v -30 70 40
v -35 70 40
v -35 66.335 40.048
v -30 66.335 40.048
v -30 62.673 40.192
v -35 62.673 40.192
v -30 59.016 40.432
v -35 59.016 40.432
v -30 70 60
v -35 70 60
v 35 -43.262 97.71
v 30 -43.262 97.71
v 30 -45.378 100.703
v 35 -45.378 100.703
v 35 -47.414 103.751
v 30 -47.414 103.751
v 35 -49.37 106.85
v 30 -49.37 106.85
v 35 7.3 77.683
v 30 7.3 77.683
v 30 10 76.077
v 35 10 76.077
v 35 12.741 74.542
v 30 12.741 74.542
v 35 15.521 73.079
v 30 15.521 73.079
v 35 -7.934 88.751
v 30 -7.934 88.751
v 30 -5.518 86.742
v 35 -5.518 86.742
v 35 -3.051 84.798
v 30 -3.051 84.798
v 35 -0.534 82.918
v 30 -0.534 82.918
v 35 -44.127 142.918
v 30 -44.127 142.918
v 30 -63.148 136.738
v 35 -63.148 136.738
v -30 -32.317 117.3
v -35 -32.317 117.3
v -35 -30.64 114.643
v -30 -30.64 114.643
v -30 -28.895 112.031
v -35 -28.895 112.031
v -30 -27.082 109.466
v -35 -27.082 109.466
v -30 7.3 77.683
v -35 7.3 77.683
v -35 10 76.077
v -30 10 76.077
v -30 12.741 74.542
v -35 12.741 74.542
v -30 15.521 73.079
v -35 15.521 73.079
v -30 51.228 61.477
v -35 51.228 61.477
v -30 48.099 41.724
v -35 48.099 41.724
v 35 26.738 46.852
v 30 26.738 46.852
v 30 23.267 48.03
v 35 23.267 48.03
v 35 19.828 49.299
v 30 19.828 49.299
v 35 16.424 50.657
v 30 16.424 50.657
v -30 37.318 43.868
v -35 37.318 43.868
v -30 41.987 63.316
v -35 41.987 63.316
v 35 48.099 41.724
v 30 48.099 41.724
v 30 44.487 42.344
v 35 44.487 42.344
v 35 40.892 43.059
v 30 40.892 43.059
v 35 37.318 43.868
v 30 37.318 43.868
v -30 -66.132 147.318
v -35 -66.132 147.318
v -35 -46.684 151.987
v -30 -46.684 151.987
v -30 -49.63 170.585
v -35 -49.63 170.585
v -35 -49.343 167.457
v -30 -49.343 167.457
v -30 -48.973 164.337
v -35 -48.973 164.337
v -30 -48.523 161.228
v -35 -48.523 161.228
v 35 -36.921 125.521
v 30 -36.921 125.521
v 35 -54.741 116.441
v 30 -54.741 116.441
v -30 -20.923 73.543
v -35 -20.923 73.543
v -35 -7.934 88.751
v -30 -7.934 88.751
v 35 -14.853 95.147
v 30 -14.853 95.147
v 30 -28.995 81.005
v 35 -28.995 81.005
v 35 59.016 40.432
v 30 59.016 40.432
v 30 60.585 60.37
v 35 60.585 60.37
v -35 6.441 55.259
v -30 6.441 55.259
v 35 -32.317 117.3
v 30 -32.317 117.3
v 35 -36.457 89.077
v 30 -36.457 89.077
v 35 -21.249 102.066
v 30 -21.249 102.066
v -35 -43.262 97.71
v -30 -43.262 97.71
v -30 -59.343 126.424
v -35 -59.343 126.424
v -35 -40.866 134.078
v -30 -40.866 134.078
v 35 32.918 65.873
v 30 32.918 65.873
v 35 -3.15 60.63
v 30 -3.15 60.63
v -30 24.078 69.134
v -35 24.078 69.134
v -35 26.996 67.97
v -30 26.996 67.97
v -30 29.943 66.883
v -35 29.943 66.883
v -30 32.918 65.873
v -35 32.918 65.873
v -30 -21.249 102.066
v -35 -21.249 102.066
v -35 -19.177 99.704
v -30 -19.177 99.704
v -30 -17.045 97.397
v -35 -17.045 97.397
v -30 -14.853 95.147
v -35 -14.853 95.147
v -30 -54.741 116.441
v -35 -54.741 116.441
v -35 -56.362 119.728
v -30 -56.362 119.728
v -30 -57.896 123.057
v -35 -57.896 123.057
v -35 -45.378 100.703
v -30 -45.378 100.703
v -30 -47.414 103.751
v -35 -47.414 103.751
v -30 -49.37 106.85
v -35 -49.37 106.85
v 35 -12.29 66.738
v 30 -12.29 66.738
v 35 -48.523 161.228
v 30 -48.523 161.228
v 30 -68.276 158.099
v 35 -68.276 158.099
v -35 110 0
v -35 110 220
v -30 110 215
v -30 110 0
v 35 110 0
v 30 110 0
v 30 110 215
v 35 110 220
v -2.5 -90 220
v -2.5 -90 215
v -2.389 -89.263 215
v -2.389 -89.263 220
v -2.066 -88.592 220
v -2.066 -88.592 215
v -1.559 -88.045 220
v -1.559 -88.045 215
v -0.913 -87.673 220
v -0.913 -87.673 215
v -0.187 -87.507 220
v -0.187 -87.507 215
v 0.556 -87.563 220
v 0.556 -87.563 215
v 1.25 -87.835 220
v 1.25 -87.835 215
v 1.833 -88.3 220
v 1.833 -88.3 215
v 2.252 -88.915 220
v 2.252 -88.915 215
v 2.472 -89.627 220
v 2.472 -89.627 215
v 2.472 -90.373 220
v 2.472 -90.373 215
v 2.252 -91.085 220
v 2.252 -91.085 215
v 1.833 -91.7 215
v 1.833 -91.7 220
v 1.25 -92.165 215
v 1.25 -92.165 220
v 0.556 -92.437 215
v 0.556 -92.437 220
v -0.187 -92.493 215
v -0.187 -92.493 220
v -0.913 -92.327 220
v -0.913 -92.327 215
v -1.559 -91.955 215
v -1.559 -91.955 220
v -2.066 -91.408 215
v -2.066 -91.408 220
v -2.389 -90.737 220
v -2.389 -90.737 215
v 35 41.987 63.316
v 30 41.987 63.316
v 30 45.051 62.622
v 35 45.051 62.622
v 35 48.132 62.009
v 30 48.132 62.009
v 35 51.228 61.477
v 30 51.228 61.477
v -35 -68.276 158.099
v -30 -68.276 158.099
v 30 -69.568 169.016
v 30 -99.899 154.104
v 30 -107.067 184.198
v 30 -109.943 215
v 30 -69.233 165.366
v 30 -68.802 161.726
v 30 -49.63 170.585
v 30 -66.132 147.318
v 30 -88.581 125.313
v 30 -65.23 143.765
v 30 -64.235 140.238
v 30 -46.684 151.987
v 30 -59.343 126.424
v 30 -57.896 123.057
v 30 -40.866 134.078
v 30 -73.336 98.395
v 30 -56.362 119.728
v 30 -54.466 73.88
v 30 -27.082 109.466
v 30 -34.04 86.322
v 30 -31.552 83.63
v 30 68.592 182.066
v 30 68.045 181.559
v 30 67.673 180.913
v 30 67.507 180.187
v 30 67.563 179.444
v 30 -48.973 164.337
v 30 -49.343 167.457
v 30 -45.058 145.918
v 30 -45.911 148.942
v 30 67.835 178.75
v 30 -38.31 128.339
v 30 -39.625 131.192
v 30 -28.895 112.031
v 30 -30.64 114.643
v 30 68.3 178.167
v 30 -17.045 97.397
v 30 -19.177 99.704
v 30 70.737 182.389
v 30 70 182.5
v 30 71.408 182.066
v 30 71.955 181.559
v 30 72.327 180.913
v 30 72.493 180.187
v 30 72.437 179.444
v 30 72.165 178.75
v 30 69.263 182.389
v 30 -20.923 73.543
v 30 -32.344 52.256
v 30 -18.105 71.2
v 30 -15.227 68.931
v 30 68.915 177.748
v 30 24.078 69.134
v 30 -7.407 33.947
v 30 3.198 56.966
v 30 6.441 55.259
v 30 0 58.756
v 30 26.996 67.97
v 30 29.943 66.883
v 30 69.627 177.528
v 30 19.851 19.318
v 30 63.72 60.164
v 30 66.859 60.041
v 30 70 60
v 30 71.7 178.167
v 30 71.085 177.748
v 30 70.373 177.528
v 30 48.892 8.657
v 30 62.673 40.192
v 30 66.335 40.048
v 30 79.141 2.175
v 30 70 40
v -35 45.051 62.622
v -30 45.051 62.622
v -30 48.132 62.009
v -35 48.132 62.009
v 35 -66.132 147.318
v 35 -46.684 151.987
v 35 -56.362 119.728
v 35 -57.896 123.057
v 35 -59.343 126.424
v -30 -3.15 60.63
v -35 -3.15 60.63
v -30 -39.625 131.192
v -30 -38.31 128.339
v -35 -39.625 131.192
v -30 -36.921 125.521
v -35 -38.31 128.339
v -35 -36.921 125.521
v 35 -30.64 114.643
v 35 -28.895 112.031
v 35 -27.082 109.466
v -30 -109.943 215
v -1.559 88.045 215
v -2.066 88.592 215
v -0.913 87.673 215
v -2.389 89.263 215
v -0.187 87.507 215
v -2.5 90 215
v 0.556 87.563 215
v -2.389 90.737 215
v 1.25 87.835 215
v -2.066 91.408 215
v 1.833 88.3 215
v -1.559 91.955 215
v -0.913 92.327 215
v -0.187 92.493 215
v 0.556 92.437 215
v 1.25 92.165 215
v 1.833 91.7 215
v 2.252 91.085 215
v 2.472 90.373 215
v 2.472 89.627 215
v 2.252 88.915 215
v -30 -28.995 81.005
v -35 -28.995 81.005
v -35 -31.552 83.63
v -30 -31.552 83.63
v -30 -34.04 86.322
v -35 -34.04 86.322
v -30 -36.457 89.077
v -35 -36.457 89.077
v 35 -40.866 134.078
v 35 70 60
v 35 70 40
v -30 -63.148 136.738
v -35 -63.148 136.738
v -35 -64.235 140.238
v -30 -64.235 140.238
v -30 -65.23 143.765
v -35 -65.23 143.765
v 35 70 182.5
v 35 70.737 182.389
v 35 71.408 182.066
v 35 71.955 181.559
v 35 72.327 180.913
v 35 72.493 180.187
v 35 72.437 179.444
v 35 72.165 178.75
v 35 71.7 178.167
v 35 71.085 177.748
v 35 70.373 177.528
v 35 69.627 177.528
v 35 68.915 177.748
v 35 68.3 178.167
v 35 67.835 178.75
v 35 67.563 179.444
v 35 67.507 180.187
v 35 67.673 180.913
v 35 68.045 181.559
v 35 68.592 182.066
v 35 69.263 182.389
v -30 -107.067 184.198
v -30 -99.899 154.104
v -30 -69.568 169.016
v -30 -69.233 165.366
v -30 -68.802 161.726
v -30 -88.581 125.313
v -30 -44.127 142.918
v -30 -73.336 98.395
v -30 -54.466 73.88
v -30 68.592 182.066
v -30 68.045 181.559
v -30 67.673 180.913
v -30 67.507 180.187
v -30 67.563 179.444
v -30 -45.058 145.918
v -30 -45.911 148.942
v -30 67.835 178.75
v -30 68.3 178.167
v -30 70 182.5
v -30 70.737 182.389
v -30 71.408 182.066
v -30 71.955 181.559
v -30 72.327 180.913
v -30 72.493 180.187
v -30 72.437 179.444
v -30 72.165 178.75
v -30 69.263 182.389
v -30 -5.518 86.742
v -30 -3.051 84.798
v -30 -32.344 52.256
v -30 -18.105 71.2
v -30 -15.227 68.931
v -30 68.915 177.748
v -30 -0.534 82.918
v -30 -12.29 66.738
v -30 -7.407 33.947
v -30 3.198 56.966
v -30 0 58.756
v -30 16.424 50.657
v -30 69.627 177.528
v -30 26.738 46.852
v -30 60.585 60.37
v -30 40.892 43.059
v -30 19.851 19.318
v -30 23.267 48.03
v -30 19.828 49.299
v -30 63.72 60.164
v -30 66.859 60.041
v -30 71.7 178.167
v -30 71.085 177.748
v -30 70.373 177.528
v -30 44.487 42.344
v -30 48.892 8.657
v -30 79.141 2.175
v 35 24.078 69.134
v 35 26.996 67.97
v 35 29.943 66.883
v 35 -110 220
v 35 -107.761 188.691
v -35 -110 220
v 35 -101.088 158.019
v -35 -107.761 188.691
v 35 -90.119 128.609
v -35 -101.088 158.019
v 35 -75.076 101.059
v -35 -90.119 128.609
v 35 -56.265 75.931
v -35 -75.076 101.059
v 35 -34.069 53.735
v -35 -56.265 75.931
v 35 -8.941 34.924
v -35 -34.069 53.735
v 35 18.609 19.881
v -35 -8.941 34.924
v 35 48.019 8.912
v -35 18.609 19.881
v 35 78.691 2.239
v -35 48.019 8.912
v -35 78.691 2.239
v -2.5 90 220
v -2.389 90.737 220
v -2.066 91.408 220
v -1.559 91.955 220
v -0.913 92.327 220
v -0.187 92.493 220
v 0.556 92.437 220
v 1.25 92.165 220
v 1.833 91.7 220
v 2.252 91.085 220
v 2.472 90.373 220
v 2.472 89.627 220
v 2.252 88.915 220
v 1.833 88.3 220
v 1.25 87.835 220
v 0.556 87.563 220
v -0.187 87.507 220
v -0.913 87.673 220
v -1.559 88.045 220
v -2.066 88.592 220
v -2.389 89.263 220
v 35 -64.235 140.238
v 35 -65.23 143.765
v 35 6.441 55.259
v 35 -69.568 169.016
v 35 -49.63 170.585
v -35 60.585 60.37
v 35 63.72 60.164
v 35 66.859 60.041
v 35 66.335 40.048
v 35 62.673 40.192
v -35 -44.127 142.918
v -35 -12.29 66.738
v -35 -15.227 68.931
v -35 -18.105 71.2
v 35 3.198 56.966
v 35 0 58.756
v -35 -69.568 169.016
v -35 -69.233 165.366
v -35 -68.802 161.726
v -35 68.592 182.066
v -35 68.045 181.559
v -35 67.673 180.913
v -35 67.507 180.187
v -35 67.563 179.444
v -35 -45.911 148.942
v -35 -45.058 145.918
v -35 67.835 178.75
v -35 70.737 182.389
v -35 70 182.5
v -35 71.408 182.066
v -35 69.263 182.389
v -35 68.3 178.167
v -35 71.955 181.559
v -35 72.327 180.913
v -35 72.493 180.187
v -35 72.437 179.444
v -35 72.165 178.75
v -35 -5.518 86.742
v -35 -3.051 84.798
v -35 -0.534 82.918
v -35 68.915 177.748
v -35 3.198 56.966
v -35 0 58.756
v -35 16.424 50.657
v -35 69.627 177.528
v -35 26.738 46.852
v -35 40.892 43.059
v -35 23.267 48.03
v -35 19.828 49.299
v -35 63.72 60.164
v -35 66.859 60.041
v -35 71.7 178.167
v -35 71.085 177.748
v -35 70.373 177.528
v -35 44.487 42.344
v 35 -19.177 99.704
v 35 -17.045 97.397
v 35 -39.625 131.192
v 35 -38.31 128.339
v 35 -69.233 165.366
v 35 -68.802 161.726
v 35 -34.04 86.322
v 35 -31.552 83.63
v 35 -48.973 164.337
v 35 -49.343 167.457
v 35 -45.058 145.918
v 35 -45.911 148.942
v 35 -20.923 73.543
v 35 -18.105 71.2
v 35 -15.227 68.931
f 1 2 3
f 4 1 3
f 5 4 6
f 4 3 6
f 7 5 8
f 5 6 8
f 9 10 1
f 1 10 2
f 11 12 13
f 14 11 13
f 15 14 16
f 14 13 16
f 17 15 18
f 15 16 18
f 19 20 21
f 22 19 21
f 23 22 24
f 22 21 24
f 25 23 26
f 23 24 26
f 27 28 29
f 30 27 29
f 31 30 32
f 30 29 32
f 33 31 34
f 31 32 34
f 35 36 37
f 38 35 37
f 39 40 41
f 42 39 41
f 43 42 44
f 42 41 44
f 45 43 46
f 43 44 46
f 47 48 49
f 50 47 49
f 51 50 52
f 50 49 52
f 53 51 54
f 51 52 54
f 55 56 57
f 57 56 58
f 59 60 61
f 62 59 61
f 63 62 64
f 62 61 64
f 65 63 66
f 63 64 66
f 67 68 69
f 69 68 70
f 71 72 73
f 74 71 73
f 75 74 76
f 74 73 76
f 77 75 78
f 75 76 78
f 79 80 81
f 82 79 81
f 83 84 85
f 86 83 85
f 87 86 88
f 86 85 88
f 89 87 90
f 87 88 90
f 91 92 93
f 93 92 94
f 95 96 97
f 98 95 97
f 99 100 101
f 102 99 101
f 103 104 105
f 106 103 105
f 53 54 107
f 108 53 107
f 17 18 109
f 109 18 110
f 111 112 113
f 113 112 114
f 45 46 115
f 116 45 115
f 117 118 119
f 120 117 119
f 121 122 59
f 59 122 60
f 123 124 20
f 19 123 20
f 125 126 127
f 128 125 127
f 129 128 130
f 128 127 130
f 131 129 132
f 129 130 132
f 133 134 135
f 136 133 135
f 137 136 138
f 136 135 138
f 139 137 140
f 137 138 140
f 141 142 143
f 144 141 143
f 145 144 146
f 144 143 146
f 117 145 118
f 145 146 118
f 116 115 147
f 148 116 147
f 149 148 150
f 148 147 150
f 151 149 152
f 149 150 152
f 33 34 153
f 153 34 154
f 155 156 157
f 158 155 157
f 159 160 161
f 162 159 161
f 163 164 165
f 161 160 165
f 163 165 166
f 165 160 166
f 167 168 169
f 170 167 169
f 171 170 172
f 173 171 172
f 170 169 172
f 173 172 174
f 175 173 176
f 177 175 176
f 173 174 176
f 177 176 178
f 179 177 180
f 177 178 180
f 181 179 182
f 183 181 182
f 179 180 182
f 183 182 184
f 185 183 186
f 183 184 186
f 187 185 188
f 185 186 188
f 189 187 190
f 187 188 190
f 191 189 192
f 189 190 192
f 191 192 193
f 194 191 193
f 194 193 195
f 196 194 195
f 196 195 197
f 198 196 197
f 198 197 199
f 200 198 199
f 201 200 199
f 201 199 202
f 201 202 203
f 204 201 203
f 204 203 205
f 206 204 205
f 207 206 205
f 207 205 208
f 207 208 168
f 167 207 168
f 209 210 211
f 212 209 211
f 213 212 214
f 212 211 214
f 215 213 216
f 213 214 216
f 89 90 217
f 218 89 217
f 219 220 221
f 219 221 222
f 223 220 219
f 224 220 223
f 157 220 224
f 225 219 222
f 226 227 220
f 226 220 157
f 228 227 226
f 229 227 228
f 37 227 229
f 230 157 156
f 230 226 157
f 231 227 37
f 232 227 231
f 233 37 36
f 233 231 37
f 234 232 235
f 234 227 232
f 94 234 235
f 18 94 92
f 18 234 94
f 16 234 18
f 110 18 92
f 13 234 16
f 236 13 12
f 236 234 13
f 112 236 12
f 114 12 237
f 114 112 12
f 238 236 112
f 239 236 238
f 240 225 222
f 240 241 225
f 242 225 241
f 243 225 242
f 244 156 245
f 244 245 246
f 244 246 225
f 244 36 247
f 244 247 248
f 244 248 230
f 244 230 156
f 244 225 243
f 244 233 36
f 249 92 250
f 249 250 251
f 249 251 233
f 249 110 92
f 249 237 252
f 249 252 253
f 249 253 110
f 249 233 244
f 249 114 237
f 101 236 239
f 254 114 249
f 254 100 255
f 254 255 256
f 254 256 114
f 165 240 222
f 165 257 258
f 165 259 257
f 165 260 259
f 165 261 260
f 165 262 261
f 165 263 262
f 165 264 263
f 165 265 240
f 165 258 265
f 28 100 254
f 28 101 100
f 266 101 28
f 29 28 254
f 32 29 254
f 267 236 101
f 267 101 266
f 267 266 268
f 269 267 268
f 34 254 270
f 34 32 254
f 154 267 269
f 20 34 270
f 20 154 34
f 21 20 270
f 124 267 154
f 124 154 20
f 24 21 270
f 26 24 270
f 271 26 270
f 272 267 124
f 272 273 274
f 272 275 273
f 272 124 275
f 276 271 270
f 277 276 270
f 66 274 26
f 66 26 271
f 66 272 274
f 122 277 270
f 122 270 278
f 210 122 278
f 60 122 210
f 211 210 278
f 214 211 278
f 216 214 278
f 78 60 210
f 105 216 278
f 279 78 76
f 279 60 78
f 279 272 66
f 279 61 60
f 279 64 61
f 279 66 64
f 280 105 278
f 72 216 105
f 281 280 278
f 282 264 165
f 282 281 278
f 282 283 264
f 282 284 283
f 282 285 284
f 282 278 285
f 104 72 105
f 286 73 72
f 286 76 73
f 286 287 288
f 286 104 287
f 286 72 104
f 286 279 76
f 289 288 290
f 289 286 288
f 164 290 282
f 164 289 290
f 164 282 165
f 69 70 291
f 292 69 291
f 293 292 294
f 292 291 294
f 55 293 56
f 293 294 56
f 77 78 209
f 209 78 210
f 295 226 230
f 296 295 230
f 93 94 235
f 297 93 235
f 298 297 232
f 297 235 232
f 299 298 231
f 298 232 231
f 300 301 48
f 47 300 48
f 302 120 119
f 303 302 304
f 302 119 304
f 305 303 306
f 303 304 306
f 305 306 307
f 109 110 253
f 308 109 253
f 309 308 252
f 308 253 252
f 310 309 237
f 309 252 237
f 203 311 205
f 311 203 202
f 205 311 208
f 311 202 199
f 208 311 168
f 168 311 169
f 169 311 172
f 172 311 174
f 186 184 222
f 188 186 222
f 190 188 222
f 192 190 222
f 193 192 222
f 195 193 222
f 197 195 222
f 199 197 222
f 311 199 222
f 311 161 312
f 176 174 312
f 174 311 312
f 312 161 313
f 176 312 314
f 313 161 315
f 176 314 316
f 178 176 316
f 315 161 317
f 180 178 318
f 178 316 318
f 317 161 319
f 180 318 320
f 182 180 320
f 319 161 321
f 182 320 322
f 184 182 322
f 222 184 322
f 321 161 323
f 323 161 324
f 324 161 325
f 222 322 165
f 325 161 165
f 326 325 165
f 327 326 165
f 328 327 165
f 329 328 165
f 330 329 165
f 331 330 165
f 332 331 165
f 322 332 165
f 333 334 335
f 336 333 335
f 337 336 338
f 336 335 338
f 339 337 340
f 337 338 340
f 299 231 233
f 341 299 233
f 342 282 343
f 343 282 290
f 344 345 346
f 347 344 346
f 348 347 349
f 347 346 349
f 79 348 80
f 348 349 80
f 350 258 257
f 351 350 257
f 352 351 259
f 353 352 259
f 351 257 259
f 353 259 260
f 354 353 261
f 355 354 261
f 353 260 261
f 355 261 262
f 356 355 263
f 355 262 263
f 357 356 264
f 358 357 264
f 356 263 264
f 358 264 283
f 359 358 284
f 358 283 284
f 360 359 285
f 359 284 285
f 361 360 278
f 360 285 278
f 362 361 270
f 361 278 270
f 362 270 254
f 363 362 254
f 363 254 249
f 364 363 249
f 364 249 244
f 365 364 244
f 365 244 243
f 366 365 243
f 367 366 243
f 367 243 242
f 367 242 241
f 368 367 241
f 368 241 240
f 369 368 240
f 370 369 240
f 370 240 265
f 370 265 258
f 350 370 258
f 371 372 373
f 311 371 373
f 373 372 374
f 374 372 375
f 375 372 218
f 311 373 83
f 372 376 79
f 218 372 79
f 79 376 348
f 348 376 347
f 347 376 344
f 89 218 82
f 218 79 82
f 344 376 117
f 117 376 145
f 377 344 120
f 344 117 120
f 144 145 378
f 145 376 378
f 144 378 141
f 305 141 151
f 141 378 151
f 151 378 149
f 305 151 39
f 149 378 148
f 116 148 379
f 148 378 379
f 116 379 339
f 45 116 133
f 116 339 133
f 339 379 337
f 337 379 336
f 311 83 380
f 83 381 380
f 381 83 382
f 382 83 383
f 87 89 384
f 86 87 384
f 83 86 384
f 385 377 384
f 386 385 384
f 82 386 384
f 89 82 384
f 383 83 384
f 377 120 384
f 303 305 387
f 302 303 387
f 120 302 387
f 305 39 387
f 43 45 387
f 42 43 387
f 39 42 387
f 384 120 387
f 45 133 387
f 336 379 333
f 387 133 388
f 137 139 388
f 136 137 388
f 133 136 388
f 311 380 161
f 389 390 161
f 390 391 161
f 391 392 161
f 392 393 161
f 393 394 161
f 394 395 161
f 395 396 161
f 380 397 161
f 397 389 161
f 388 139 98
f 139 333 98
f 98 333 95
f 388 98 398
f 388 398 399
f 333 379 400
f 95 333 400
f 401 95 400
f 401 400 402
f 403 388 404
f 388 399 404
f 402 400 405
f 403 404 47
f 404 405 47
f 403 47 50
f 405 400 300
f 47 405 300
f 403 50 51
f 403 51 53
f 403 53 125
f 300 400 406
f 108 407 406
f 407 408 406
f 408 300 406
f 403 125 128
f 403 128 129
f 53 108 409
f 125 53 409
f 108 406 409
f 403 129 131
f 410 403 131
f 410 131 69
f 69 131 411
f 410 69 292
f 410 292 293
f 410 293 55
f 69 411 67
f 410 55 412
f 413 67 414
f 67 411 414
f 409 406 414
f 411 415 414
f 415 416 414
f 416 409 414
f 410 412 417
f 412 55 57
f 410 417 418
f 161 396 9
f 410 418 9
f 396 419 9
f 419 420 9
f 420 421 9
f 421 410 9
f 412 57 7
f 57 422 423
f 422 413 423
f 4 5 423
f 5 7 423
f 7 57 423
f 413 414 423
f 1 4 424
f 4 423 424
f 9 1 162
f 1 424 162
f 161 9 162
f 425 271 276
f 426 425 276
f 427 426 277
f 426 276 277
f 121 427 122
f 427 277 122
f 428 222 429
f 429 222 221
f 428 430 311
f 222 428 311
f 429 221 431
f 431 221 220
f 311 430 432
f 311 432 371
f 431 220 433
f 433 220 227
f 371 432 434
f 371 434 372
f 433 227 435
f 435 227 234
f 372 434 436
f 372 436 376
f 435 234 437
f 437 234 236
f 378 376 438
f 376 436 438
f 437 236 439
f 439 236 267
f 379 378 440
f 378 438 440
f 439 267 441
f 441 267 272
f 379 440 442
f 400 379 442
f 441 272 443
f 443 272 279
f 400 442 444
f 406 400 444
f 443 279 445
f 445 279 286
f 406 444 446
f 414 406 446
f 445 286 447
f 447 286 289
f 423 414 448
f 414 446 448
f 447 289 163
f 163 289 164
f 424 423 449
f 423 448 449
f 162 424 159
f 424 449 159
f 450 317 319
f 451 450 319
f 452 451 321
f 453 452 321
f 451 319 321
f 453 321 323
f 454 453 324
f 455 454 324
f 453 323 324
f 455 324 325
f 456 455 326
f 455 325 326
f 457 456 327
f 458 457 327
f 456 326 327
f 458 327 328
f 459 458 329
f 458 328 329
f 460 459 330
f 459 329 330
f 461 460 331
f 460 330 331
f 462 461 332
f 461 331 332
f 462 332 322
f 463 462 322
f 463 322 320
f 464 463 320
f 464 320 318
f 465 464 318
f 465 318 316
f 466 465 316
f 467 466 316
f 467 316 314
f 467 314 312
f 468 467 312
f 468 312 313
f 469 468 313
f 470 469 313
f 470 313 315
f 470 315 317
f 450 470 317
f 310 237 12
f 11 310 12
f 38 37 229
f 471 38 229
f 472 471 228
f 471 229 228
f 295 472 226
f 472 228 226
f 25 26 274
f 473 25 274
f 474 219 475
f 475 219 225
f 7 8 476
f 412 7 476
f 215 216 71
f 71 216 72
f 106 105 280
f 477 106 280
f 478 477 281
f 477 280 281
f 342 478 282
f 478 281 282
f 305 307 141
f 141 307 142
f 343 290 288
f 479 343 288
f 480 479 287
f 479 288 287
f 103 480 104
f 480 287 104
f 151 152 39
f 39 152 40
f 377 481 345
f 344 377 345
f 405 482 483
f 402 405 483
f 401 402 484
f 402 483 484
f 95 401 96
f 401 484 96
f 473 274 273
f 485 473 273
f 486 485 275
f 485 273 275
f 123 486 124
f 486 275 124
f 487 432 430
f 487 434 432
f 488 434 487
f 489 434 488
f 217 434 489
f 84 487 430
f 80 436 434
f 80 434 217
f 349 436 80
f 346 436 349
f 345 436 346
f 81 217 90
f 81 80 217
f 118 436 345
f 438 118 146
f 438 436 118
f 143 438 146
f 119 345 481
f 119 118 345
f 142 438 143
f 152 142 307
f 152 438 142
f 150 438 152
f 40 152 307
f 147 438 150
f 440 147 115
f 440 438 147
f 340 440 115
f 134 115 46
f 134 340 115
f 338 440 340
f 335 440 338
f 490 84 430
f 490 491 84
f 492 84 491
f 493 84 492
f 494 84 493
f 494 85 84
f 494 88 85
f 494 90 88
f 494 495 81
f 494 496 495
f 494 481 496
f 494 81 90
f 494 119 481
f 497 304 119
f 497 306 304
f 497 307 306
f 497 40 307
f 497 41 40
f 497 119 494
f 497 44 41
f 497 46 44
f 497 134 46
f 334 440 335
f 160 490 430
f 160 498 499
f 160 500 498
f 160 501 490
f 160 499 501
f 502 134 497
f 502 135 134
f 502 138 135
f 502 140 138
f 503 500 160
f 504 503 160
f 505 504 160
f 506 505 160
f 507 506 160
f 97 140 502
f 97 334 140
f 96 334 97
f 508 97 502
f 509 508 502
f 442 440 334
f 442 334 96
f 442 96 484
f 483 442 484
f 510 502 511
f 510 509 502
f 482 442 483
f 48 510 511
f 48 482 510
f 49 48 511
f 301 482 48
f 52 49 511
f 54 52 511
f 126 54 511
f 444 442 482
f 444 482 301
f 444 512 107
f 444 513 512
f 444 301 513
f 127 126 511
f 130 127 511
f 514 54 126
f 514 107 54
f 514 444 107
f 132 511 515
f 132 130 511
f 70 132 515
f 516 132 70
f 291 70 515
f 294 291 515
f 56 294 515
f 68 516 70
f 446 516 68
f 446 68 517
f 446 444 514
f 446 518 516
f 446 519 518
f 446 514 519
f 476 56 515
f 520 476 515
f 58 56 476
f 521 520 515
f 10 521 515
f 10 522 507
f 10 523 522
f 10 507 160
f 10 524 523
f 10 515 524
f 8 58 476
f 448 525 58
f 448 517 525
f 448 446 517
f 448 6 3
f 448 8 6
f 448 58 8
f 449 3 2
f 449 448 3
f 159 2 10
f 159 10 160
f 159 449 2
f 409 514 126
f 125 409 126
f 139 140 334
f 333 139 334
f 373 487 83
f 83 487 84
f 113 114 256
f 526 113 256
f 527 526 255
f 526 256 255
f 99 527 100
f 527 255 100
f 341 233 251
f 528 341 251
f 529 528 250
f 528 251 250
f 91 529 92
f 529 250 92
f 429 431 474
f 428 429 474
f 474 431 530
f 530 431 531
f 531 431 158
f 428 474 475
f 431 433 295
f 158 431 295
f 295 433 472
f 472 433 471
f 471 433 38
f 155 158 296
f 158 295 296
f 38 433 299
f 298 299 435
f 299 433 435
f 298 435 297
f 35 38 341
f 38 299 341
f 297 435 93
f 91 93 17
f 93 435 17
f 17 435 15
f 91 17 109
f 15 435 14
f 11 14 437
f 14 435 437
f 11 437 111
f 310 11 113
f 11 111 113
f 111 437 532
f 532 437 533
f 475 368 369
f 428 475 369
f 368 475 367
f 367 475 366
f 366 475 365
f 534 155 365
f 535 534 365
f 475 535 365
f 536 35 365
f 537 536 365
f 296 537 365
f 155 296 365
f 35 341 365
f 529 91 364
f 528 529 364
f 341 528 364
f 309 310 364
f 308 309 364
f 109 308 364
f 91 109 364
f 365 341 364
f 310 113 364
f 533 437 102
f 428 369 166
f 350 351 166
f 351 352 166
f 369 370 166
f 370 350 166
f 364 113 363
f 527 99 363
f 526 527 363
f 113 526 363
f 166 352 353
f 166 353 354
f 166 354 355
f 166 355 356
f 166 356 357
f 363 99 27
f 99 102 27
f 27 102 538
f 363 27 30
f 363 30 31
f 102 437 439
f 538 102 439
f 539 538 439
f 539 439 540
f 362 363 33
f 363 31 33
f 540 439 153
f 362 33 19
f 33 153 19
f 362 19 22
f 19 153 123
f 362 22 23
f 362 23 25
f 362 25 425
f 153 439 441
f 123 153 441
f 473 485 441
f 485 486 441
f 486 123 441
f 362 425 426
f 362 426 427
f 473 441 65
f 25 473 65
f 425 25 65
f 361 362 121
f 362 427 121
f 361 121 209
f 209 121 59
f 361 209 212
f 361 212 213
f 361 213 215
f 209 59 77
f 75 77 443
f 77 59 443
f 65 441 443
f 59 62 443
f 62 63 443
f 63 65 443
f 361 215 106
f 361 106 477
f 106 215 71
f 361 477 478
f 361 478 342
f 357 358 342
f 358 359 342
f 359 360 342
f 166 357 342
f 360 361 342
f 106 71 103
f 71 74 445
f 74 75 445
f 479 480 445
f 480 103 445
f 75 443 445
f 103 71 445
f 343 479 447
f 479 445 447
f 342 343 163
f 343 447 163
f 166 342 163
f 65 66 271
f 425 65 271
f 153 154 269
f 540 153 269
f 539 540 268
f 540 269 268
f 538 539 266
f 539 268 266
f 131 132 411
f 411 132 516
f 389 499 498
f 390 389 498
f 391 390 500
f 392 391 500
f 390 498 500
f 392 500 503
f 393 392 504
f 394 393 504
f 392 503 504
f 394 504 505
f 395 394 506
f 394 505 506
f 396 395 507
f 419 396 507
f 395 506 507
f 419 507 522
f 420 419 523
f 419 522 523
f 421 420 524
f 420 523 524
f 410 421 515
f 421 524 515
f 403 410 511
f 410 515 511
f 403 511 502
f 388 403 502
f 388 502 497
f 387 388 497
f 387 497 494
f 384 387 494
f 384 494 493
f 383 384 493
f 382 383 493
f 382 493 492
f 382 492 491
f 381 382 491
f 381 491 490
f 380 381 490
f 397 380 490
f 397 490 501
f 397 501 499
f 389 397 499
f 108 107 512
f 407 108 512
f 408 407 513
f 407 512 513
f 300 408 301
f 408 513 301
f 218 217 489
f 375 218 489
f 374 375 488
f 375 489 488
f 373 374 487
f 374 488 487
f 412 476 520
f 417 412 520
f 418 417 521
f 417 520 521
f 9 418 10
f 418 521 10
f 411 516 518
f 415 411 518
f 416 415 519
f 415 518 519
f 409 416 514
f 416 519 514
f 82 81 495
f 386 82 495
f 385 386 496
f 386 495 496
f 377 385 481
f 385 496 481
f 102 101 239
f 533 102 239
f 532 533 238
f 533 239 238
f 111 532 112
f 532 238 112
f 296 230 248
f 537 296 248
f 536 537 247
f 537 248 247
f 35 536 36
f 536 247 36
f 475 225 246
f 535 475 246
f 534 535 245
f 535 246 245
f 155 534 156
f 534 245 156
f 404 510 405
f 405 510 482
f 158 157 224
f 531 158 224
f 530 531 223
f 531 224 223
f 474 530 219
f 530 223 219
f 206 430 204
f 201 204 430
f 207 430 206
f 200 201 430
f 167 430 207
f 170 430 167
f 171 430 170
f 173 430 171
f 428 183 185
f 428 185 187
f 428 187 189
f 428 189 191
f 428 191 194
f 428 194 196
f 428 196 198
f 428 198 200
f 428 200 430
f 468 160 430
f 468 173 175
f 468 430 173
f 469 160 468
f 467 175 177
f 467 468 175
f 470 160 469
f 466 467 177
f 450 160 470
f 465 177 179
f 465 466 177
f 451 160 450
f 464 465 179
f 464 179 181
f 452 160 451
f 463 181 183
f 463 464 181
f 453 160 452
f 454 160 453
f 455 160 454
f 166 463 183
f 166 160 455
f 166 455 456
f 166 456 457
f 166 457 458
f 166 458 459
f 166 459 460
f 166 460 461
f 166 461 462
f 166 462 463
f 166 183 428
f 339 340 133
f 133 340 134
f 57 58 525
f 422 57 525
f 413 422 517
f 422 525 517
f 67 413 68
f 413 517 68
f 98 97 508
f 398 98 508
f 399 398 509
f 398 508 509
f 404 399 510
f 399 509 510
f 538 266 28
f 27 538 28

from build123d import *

# Parameters (mm, degrees)
SKETCH1_W             = 5
SKETCH1_H             = 220
BOSS_EXTRUDE1_DEPTH   = 220
BOSS_EXTRUDE1_2_DEPTH = 220
SKETCH2_W             = 60
SKETCH2_H             = 220
BOSS_EXTRUDE2_DEPTH   = 5
CUT_EXTRUDE1_DEPTH    = 110
SKETCH7_R             = 2.5
CUT_EXTRUDE6_DEPTH    = 134
SKETCH9_R             = 2.5
CUT_EXTRUDE8_DEPTH    = 134


with BuildPart() as part:
    # Sketch1 → Boss-Extrude1 (new body)
    with BuildSketch(Plane.XY):
        with Locations((32.5, 0)):
            Rectangle(SKETCH1_W, SKETCH1_H)
    extrude(amount=BOSS_EXTRUDE1_DEPTH)



with BuildPart() as body_2:
    # Sketch1 → Boss-Extrude1 2 (new body)
    with BuildSketch(Plane.XY):
        with Locations((-32.5, 0)):
            Rectangle(SKETCH1_W, SKETCH1_H)
    extrude(amount=BOSS_EXTRUDE1_2_DEPTH)


with BuildPart() as part_1:
    add(part.part)

    add(body_2.part)  # Boss-Extrude2 merges body 2
    # Sketch2 → Boss-Extrude2 (add)
    with BuildSketch(Plane.XY.offset(220)):
        Rectangle(SKETCH2_W, SKETCH2_H)
    extrude(amount=-BOSS_EXTRUDE2_DEPTH)

    # Sketch3 → Cut-Extrude1 (cut)
    with BuildSketch(Plane.ZY.offset(35)):
        with BuildLine():
            Line((0, 110), (0, -110))
            Line((0, -110), (220, -110))
            ThreePointArc((220, -110), (64.436508139, -45.563491861), (0, 110))
        make_face()
    extrude(amount=-CUT_EXTRUDE1_DEPTH, mode=Mode.SUBTRACT)

    # Sketch7 → Cut-Extrude6 (cut)
    with BuildSketch(Plane(origin=(0, 0, 215), x_dir=(-1, 0, 0), z_dir=(0, 0, -1))):
        with Locations((0, 90)):
            Circle(SKETCH7_R)
        with Locations((0, -90)):
            Circle(SKETCH7_R)
    extrude(amount=-CUT_EXTRUDE6_DEPTH, mode=Mode.SUBTRACT)

    # Sketch9 → Cut-Extrude8 (cut)
    with BuildSketch(Plane.ZY.offset(35)):
        with BuildLine():
            ThreePointArc((60.369919952, 60.584908513), (60.092515651, 65.288822109), (60, 70))
            Line((60, 70), (40, 70))
            ThreePointArc((40, 70), (40.107934926, 64.503625794), (40.431573277, 59.015726598))
            Line((40.431573277, 59.015726598), (60.369919952, 60.584908513))
        make_face()
        with BuildLine():
            ThreePointArc((63.315609552, 41.986556337), (62.305766352, 46.589161358), (61.477399129, 51.227864195))
            Line((61.477399129, 51.227864195), (41.723632317, 48.099174894))
            ThreePointArc((41.723632317, 48.099174894), (42.690060744, 42.687354918), (43.868211144, 37.31764906))
            Line((43.868211144, 37.31764906), (63.315609552, 41.986556337))
        make_face()
        with BuildLine():
            ThreePointArc((69.134456099, 24.077988116), (67.417039689, 28.465953151), (65.873218045, 32.917960675))
            Line((65.873218045, 32.917960675), (46.852087719, 26.737620788))
            ThreePointArc((46.852087719, 26.737620788), (48.653212971, 21.543612009), (50.656865448, 16.424319469))
            Line((50.656865448, 16.424319469), (69.134456099, 24.077988116))
        make_face()
        with BuildLine():
            ThreePointArc((77.683180278, 7.300172234), (75.300479151, 11.36545102), (73.079217097, 15.521140031))
            Line((73.079217097, 15.521140031), (55.259086614, 6.441330036))
            ThreePointArc((55.259086614, 6.441330036), (57.85055901, 1.59302619), (60.63037699, -3.14979906))
            Line((60.63037699, -3.14979906), (77.683180278, 7.300172234))
        make_face()
        with BuildLine():
            ThreePointArc((88.751284128, -7.9337658), (85.761968294, -4.291273917), (82.917960675, -0.534230275))
            Line((82.917960675, -0.534230275), (66.737620788, -12.289935321))
            ThreePointArc((66.737620788, -12.289935321), (70.055629677, -16.673152903), (73.543164816, -20.922726766))
            Line((73.543164816, -20.922726766), (88.751284128, -7.9337658))
        make_face()
        with BuildLine():
            ThreePointArc((102.0662342, -21.248715872), (98.543910536, -18.118701132), (95.147186258, -14.852813742))
            Line((95.147186258, -14.852813742), (81.005050634, -28.994949366))
            ThreePointArc((81.005050634, -28.994949366), (84.967895625, -32.805151321), (89.077273234, -36.456835184))
            Line((89.077273234, -36.456835184), (102.0662342, -21.248715872))
        make_face()
        with BuildLine():
            ThreePointArc((117.300172234, -32.316819722), (113.331572038, -29.776353476), (109.465769725, -27.082039325))
            Line((109.465769725, -27.082039325), (97.710064679, -43.262379212))
            ThreePointArc((97.710064679, -43.262379212), (102.220167377, -46.405745722), (106.85020094, -49.36962301))
            Line((106.85020094, -49.36962301), (117.300172234, -32.316819722))
        make_face()
        with BuildLine():
            ThreePointArc((134.077988116, -40.865543901), (129.760831496, -38.977180859), (125.521140031, -36.920782903))
            Line((125.521140031, -36.920782903), (116.441330036, -54.740913386))
            ThreePointArc((116.441330036, -54.740913386), (121.387636745, -57.140044336), (126.424319469, -59.343134552))
            Line((126.424319469, -59.343134552), (134.077988116, -40.865543901))
        make_face()
        with BuildLine():
            ThreePointArc((151.986556337, -46.684390448), (147.427146016, -45.494628374), (142.917960675, -44.126781955))
            Line((142.917960675, -44.126781955), (136.737620788, -63.147912281))
            ThreePointArc((136.737620788, -63.147912281), (141.998337019, -64.743733104), (147.31764906, -66.131788856))
            Line((147.31764906, -66.131788856), (151.986556337, -46.684390448))
        make_face()
        with BuildLine():
            ThreePointArc((170.584908513, -49.630080048), (165.895512305, -49.168214835), (161.227864195, -48.522600871))
            Line((161.227864195, -48.522600871), (158.099174894, -68.276367683))
            ThreePointArc((158.099174894, -68.276367683), (163.544764356, -69.029583974), (169.015726598, -69.568426723))
            Line((169.015726598, -69.568426723), (170.584908513, -49.630080048))
        make_face()
        with Locations((180, 70)):
            Circle(SKETCH9_R)
    extrude(amount=-CUT_EXTRUDE8_DEPTH, mode=Mode.SUBTRACT)


solid = part_1.part
